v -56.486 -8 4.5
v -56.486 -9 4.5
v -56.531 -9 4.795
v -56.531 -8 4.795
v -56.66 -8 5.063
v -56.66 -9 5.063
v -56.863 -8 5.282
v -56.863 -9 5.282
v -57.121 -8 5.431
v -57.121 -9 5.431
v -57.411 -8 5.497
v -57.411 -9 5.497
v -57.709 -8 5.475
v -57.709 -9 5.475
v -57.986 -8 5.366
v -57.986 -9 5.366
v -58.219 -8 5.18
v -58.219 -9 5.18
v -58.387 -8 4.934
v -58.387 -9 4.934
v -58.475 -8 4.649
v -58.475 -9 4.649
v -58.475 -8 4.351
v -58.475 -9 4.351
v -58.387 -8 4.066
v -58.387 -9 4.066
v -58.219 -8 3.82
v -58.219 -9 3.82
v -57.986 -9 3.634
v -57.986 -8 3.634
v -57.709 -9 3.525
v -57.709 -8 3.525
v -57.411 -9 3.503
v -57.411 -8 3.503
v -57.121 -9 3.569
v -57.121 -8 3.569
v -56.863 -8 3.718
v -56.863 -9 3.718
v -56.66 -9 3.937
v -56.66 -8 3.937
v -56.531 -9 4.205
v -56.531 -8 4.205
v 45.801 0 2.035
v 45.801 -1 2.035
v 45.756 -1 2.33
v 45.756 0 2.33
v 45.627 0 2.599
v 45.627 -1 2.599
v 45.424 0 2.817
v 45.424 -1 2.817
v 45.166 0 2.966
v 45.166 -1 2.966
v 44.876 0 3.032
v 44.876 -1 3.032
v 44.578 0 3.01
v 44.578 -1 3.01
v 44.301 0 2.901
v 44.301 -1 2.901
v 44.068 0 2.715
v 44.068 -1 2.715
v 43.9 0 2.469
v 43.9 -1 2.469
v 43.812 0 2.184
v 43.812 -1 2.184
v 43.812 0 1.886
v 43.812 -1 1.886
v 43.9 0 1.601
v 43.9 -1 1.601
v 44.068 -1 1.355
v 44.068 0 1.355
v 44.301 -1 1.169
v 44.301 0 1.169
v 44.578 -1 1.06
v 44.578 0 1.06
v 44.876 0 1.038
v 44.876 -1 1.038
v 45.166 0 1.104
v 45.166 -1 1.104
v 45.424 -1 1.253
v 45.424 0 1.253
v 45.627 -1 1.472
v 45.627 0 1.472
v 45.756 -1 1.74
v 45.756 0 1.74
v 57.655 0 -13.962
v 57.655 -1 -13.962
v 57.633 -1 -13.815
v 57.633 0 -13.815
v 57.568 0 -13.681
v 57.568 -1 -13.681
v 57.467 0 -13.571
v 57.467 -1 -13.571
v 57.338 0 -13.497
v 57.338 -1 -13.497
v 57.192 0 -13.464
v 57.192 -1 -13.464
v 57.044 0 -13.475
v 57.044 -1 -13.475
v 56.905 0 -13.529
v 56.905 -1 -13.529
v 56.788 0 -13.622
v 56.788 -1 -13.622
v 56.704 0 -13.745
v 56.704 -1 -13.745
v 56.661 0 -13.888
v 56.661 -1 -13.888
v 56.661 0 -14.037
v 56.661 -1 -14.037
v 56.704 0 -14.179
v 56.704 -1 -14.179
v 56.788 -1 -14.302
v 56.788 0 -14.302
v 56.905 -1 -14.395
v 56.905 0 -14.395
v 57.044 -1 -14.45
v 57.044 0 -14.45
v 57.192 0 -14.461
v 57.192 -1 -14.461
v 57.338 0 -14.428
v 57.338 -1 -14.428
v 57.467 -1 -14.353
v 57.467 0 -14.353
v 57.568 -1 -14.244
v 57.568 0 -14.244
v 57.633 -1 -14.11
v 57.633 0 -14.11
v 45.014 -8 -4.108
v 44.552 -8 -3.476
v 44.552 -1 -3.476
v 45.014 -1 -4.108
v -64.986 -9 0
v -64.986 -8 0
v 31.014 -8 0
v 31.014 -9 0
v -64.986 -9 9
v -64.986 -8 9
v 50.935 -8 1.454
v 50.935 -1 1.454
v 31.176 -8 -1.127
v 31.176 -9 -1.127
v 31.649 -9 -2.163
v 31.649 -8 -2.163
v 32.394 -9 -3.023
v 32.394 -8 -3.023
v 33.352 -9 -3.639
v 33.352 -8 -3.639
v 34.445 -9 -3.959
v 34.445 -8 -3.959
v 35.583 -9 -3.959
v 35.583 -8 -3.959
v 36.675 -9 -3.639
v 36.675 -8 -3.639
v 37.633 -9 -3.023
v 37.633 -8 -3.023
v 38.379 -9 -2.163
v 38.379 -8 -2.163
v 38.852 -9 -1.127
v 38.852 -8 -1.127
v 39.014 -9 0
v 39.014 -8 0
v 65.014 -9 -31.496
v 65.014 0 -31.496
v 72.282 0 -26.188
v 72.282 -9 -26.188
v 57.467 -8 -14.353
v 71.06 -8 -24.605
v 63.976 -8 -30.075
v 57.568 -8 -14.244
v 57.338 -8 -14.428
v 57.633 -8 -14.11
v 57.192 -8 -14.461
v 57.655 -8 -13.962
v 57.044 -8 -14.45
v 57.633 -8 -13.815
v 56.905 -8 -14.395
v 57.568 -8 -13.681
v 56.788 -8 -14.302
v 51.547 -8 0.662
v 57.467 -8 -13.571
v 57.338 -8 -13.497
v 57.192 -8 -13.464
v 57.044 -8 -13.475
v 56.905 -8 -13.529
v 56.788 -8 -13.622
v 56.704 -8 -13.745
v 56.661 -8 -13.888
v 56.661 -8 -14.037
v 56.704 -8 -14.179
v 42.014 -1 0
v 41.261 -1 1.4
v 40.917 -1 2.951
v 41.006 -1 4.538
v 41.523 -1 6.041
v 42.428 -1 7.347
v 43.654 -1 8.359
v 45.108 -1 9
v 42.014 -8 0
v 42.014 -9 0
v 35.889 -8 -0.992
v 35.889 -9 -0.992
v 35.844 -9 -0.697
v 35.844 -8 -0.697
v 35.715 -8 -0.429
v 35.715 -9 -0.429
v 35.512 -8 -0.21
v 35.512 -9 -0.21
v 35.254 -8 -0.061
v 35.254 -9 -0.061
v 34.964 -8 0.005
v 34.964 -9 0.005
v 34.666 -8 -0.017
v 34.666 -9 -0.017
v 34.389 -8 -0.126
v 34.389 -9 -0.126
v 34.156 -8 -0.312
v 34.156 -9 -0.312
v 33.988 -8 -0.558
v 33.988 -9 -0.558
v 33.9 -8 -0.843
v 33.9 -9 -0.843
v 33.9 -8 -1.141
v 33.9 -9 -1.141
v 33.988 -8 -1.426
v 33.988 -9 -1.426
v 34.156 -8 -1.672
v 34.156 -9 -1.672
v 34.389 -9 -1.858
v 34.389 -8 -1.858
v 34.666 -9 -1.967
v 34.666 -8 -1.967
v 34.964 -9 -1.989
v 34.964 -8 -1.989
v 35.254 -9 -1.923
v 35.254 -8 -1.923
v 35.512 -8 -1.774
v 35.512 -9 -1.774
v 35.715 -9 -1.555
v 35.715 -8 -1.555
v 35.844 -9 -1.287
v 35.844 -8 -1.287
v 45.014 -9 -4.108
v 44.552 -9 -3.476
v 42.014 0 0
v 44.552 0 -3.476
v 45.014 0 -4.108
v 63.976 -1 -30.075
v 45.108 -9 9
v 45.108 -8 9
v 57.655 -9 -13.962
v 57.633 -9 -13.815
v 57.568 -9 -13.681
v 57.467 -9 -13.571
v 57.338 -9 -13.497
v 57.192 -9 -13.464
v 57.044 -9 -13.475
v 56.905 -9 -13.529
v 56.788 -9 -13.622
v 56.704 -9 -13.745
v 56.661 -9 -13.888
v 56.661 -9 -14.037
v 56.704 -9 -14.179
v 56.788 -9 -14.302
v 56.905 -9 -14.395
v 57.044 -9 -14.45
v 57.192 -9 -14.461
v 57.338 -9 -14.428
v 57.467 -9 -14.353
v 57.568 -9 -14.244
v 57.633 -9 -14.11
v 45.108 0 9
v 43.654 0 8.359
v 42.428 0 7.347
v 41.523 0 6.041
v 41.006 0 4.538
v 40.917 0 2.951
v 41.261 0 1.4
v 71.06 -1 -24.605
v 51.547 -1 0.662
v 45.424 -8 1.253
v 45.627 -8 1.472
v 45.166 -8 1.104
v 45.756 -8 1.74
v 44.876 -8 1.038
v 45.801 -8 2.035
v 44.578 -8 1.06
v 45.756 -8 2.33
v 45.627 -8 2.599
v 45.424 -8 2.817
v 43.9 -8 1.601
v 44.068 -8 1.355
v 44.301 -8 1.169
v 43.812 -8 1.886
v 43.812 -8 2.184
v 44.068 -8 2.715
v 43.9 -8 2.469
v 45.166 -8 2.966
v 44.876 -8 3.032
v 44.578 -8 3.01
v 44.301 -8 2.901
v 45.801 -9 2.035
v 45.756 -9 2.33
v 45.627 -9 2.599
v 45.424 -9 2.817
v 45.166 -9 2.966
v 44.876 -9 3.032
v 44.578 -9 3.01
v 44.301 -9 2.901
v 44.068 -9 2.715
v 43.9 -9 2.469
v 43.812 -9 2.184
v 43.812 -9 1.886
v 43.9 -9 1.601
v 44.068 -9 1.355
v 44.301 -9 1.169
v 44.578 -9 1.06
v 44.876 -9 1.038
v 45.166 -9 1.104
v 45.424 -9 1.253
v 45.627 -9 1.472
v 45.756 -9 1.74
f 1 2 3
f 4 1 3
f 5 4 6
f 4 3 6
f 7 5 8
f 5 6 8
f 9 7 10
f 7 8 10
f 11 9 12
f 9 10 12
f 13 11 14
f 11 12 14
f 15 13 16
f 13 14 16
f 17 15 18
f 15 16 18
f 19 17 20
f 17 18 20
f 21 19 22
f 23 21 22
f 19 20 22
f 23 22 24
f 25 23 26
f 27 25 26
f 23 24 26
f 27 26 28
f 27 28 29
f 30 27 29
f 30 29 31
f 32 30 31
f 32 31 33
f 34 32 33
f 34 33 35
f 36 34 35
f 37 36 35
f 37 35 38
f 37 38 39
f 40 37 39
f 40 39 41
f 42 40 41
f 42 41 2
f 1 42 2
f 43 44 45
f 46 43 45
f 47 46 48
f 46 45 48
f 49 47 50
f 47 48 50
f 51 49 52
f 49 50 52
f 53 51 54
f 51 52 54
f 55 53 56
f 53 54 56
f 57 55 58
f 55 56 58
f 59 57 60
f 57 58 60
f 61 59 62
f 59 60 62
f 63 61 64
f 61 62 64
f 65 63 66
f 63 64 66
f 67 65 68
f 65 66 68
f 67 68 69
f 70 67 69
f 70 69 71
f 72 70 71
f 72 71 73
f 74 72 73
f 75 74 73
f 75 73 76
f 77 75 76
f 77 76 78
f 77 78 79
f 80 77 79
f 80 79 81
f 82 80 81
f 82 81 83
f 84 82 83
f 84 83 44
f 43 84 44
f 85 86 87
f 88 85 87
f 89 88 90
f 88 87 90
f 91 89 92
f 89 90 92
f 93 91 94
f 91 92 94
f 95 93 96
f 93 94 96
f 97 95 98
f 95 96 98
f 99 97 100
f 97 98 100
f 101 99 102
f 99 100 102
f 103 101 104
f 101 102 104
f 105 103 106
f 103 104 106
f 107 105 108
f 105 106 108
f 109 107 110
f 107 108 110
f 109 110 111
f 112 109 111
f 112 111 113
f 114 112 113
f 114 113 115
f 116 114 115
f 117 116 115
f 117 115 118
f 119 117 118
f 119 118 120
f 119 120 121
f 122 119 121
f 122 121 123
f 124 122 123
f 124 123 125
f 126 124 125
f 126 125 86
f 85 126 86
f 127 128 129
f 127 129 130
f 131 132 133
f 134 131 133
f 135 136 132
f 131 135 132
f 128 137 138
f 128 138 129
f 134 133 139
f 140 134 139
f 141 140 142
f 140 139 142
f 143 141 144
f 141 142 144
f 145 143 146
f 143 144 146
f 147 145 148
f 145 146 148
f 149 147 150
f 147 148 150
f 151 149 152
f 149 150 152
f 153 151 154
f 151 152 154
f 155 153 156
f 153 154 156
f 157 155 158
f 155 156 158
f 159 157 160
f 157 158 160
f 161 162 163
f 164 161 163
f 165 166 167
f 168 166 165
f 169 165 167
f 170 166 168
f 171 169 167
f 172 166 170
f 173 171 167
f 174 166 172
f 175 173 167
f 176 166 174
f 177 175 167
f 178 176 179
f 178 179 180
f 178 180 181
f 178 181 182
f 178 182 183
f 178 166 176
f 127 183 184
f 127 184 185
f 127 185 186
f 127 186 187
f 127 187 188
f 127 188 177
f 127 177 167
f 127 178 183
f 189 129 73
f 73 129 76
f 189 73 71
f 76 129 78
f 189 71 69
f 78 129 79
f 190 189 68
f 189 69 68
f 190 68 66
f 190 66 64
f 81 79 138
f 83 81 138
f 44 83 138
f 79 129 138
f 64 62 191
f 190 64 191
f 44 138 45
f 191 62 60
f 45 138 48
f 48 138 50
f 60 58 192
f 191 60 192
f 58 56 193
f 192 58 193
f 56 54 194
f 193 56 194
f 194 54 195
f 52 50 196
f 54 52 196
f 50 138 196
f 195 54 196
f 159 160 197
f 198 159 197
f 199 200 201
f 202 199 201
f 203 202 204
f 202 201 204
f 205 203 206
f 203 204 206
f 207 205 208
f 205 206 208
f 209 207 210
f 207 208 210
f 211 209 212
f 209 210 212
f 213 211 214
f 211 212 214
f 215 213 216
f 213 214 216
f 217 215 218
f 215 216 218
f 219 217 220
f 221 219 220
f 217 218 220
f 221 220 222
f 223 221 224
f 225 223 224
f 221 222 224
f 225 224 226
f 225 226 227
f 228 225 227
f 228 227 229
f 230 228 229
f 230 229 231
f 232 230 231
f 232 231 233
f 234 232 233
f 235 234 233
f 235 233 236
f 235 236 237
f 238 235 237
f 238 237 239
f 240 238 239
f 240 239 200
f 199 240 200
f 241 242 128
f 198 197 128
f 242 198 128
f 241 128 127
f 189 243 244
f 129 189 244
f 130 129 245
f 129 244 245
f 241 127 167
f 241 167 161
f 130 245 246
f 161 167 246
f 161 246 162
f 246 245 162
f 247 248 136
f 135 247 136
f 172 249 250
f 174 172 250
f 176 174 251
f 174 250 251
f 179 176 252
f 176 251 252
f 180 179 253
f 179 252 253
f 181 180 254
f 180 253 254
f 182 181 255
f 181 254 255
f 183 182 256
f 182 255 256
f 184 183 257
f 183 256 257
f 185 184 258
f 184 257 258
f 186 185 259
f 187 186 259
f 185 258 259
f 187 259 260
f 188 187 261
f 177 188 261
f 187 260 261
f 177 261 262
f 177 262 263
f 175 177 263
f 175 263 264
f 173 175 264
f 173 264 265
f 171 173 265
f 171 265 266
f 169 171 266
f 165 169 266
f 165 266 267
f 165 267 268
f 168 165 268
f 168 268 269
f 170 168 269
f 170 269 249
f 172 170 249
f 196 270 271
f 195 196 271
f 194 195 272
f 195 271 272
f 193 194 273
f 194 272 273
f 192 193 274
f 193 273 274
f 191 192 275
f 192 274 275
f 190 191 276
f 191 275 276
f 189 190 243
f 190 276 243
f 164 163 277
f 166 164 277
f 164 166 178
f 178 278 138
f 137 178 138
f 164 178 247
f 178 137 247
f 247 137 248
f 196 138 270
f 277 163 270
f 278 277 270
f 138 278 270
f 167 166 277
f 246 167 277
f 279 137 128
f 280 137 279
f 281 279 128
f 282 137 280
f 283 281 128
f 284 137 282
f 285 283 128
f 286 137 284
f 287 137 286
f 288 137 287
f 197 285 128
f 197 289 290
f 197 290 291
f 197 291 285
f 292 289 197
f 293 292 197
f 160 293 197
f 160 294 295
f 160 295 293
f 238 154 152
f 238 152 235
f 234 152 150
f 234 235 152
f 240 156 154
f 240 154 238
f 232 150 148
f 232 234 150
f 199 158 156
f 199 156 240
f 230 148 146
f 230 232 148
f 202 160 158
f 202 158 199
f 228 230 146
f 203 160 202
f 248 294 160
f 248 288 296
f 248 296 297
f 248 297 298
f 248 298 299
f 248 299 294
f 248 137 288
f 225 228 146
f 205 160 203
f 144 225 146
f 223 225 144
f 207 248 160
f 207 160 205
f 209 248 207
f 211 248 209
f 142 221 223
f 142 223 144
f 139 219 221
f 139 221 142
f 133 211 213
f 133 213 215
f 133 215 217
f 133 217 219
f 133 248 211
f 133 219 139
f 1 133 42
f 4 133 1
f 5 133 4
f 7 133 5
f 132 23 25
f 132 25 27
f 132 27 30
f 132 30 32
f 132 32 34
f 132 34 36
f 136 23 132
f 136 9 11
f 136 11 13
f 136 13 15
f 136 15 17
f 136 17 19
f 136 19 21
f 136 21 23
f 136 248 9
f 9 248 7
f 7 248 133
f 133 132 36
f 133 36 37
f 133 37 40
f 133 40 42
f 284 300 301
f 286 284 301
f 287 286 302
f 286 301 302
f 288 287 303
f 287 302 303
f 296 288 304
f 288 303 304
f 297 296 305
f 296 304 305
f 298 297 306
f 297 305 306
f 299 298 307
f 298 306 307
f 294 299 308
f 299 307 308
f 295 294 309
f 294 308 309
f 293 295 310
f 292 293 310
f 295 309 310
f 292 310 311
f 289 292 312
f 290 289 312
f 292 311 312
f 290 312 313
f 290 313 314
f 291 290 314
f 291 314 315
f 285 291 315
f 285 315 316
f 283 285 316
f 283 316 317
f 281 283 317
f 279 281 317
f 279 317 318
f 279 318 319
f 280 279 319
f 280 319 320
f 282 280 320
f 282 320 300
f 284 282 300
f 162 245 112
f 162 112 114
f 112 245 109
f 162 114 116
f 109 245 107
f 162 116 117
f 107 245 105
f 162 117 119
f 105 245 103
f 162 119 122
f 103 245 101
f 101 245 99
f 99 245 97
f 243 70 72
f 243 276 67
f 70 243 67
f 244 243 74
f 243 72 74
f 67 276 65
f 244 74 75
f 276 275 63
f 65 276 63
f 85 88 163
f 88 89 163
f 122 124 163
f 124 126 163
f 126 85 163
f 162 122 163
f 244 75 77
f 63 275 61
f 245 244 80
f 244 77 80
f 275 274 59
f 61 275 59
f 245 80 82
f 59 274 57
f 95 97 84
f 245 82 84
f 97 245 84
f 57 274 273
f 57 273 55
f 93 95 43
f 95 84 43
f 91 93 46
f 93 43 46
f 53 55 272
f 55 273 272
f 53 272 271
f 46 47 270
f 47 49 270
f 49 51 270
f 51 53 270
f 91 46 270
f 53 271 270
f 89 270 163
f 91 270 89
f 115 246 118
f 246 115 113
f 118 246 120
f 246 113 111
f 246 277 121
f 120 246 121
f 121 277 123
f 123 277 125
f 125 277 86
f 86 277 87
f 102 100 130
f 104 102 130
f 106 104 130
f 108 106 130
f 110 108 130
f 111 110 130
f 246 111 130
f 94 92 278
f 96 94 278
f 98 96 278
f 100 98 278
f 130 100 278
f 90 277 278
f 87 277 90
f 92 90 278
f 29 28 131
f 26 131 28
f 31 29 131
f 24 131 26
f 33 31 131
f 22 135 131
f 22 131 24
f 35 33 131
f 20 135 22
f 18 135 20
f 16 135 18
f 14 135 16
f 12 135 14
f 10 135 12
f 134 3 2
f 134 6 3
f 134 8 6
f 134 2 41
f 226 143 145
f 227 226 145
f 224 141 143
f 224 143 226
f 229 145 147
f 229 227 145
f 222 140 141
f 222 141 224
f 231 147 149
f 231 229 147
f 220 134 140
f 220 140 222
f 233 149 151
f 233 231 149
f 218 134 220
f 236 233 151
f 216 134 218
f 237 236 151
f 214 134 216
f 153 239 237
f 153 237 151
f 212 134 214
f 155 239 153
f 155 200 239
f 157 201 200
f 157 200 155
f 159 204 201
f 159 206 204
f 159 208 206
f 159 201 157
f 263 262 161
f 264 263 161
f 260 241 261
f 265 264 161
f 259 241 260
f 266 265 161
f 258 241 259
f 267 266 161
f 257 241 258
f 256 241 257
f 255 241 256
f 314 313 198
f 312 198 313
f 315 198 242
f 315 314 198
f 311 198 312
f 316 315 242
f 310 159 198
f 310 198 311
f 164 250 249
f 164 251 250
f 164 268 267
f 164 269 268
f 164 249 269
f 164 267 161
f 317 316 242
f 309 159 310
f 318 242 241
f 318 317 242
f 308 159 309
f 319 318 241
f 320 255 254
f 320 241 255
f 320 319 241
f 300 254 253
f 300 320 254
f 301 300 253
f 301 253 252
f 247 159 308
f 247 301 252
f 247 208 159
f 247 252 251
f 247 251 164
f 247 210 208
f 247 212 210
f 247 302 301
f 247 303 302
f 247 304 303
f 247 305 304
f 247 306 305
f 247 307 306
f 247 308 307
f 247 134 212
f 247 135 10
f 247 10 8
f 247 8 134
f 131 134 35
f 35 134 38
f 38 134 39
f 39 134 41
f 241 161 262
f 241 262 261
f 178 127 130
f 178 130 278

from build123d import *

# Parameters (mm, degrees)
F1_DEPTH  = 9
F3_DEPTH  = 8
F4_W      = 7
F4_H      = 42.4595763843
F4_H_2    = 6.157477504
F5_DEPTH  = 111.888617615
F7_DEPTH  = 9
F8_R      = 1
F8_R_2    = 0.5
F9_DEPTH  = 9.001
F10_R     = 1
F11_DEPTH = 9.001


# Not quite as in the source:
# - a feature names something its author has since deleted; it is built from what else it names


with BuildPart() as f1:
    # F0 (on Front) → F1 (new body)
    with BuildSketch(Plane.XZ):
        Polygon((-64.9861803949, 9), (-64.9861803949, 0), (31.0138196051, 0), (39.0138196051, 0), (42.0138196051, 0), (65.0138196051, -31.496031496), (72.2821345657, -26.1883391884), (45.1079792442, 9), align=None)
        with BuildLine():
            Line((39.0138196051, 0), (31.0138196051, 0))
            ThreePointArc((31.0138196051, 0), (35.0138196051, -4), (39.0138196051, 0))
        make_face()
    extrude(amount=F1_DEPTH)

    # F2 (on face) → F3 (cut)
    with BuildSketch(Plane(origin=(0, 0, 0), x_dir=(-1, 0, 0), z_dir=(0, 1, 0))):
        with BuildLine():
            ThreePointArc((-45.1079792442, 9), (-41.2127769921, 5.307273962), (-42.0138196051, 0))
            Line((-42.0138196051, 0), (-39.0138196051, 0))
            ThreePointArc((-39.0138196051, 0), (-35.0138196051, -4), (-31.0138196051, 0))
            Line((-31.0138196051, 0), (64.9861803949, 0))
            Line((64.9861803949, 0), (64.9861803949, 9))
            Line((64.9861803949, 9), (-45.1079792442, 9))
        make_face()
    extrude(amount=-F3_DEPTH, mode=Mode.SUBTRACT)

    # F4 (on face) → F5 (cut, through all)
    with BuildSketch(Plane(origin=(32.6104059702, 0, 25.1833492962), x_dir=(0, 1, 0), z_dir=(0.7914681616, 0, 0.6112103968))):
        with Locations((-4.5, -41.6770406282)):
            Rectangle(F4_W, F4_H)
        with Locations((-4.5, -17.368513684)):
            Rectangle(F4_W, F4_H_2)
    extrude(amount=-F5_DEPTH, mode=Mode.SUBTRACT)

    # F6 (on face) → F7 (join)
    with BuildSketch(Plane.XZ.offset(9)):
        Polygon((45.0138196051, -4.1081780212), (51.5466572041, 0.662431406), (50.9354468073, 1.4538995677), (44.551974041, -3.4757300893), align=None)
    extrude(amount=-F7_DEPTH)

    # F8 (on face) → F9 (cut, through all)
    with BuildSketch(Plane.XZ.offset(9)):
        with Locations((44.8008679783, 2.0352441098)):
            Circle(F8_R)
        with Locations((57.1549696039, -13.9623209745)):
            Circle(F8_R_2)
        with Locations((-57.4861803949, 4.5)):
            Circle(F8_R)
    extrude(amount=-F9_DEPTH, mode=Mode.SUBTRACT)

    # F10 (on face) → F11 (cut, through all)
    with BuildSketch(Plane.XZ.offset(9)):
        with Locations((-60.9861803949, -1.4662119793)):
            Circle(F10_R)
        with Locations((34.8888196051, -0.9921567416)):
            Circle(F10_R)
    extrude(amount=-F11_DEPTH, mode=Mode.SUBTRACT)


solid = f1.part
